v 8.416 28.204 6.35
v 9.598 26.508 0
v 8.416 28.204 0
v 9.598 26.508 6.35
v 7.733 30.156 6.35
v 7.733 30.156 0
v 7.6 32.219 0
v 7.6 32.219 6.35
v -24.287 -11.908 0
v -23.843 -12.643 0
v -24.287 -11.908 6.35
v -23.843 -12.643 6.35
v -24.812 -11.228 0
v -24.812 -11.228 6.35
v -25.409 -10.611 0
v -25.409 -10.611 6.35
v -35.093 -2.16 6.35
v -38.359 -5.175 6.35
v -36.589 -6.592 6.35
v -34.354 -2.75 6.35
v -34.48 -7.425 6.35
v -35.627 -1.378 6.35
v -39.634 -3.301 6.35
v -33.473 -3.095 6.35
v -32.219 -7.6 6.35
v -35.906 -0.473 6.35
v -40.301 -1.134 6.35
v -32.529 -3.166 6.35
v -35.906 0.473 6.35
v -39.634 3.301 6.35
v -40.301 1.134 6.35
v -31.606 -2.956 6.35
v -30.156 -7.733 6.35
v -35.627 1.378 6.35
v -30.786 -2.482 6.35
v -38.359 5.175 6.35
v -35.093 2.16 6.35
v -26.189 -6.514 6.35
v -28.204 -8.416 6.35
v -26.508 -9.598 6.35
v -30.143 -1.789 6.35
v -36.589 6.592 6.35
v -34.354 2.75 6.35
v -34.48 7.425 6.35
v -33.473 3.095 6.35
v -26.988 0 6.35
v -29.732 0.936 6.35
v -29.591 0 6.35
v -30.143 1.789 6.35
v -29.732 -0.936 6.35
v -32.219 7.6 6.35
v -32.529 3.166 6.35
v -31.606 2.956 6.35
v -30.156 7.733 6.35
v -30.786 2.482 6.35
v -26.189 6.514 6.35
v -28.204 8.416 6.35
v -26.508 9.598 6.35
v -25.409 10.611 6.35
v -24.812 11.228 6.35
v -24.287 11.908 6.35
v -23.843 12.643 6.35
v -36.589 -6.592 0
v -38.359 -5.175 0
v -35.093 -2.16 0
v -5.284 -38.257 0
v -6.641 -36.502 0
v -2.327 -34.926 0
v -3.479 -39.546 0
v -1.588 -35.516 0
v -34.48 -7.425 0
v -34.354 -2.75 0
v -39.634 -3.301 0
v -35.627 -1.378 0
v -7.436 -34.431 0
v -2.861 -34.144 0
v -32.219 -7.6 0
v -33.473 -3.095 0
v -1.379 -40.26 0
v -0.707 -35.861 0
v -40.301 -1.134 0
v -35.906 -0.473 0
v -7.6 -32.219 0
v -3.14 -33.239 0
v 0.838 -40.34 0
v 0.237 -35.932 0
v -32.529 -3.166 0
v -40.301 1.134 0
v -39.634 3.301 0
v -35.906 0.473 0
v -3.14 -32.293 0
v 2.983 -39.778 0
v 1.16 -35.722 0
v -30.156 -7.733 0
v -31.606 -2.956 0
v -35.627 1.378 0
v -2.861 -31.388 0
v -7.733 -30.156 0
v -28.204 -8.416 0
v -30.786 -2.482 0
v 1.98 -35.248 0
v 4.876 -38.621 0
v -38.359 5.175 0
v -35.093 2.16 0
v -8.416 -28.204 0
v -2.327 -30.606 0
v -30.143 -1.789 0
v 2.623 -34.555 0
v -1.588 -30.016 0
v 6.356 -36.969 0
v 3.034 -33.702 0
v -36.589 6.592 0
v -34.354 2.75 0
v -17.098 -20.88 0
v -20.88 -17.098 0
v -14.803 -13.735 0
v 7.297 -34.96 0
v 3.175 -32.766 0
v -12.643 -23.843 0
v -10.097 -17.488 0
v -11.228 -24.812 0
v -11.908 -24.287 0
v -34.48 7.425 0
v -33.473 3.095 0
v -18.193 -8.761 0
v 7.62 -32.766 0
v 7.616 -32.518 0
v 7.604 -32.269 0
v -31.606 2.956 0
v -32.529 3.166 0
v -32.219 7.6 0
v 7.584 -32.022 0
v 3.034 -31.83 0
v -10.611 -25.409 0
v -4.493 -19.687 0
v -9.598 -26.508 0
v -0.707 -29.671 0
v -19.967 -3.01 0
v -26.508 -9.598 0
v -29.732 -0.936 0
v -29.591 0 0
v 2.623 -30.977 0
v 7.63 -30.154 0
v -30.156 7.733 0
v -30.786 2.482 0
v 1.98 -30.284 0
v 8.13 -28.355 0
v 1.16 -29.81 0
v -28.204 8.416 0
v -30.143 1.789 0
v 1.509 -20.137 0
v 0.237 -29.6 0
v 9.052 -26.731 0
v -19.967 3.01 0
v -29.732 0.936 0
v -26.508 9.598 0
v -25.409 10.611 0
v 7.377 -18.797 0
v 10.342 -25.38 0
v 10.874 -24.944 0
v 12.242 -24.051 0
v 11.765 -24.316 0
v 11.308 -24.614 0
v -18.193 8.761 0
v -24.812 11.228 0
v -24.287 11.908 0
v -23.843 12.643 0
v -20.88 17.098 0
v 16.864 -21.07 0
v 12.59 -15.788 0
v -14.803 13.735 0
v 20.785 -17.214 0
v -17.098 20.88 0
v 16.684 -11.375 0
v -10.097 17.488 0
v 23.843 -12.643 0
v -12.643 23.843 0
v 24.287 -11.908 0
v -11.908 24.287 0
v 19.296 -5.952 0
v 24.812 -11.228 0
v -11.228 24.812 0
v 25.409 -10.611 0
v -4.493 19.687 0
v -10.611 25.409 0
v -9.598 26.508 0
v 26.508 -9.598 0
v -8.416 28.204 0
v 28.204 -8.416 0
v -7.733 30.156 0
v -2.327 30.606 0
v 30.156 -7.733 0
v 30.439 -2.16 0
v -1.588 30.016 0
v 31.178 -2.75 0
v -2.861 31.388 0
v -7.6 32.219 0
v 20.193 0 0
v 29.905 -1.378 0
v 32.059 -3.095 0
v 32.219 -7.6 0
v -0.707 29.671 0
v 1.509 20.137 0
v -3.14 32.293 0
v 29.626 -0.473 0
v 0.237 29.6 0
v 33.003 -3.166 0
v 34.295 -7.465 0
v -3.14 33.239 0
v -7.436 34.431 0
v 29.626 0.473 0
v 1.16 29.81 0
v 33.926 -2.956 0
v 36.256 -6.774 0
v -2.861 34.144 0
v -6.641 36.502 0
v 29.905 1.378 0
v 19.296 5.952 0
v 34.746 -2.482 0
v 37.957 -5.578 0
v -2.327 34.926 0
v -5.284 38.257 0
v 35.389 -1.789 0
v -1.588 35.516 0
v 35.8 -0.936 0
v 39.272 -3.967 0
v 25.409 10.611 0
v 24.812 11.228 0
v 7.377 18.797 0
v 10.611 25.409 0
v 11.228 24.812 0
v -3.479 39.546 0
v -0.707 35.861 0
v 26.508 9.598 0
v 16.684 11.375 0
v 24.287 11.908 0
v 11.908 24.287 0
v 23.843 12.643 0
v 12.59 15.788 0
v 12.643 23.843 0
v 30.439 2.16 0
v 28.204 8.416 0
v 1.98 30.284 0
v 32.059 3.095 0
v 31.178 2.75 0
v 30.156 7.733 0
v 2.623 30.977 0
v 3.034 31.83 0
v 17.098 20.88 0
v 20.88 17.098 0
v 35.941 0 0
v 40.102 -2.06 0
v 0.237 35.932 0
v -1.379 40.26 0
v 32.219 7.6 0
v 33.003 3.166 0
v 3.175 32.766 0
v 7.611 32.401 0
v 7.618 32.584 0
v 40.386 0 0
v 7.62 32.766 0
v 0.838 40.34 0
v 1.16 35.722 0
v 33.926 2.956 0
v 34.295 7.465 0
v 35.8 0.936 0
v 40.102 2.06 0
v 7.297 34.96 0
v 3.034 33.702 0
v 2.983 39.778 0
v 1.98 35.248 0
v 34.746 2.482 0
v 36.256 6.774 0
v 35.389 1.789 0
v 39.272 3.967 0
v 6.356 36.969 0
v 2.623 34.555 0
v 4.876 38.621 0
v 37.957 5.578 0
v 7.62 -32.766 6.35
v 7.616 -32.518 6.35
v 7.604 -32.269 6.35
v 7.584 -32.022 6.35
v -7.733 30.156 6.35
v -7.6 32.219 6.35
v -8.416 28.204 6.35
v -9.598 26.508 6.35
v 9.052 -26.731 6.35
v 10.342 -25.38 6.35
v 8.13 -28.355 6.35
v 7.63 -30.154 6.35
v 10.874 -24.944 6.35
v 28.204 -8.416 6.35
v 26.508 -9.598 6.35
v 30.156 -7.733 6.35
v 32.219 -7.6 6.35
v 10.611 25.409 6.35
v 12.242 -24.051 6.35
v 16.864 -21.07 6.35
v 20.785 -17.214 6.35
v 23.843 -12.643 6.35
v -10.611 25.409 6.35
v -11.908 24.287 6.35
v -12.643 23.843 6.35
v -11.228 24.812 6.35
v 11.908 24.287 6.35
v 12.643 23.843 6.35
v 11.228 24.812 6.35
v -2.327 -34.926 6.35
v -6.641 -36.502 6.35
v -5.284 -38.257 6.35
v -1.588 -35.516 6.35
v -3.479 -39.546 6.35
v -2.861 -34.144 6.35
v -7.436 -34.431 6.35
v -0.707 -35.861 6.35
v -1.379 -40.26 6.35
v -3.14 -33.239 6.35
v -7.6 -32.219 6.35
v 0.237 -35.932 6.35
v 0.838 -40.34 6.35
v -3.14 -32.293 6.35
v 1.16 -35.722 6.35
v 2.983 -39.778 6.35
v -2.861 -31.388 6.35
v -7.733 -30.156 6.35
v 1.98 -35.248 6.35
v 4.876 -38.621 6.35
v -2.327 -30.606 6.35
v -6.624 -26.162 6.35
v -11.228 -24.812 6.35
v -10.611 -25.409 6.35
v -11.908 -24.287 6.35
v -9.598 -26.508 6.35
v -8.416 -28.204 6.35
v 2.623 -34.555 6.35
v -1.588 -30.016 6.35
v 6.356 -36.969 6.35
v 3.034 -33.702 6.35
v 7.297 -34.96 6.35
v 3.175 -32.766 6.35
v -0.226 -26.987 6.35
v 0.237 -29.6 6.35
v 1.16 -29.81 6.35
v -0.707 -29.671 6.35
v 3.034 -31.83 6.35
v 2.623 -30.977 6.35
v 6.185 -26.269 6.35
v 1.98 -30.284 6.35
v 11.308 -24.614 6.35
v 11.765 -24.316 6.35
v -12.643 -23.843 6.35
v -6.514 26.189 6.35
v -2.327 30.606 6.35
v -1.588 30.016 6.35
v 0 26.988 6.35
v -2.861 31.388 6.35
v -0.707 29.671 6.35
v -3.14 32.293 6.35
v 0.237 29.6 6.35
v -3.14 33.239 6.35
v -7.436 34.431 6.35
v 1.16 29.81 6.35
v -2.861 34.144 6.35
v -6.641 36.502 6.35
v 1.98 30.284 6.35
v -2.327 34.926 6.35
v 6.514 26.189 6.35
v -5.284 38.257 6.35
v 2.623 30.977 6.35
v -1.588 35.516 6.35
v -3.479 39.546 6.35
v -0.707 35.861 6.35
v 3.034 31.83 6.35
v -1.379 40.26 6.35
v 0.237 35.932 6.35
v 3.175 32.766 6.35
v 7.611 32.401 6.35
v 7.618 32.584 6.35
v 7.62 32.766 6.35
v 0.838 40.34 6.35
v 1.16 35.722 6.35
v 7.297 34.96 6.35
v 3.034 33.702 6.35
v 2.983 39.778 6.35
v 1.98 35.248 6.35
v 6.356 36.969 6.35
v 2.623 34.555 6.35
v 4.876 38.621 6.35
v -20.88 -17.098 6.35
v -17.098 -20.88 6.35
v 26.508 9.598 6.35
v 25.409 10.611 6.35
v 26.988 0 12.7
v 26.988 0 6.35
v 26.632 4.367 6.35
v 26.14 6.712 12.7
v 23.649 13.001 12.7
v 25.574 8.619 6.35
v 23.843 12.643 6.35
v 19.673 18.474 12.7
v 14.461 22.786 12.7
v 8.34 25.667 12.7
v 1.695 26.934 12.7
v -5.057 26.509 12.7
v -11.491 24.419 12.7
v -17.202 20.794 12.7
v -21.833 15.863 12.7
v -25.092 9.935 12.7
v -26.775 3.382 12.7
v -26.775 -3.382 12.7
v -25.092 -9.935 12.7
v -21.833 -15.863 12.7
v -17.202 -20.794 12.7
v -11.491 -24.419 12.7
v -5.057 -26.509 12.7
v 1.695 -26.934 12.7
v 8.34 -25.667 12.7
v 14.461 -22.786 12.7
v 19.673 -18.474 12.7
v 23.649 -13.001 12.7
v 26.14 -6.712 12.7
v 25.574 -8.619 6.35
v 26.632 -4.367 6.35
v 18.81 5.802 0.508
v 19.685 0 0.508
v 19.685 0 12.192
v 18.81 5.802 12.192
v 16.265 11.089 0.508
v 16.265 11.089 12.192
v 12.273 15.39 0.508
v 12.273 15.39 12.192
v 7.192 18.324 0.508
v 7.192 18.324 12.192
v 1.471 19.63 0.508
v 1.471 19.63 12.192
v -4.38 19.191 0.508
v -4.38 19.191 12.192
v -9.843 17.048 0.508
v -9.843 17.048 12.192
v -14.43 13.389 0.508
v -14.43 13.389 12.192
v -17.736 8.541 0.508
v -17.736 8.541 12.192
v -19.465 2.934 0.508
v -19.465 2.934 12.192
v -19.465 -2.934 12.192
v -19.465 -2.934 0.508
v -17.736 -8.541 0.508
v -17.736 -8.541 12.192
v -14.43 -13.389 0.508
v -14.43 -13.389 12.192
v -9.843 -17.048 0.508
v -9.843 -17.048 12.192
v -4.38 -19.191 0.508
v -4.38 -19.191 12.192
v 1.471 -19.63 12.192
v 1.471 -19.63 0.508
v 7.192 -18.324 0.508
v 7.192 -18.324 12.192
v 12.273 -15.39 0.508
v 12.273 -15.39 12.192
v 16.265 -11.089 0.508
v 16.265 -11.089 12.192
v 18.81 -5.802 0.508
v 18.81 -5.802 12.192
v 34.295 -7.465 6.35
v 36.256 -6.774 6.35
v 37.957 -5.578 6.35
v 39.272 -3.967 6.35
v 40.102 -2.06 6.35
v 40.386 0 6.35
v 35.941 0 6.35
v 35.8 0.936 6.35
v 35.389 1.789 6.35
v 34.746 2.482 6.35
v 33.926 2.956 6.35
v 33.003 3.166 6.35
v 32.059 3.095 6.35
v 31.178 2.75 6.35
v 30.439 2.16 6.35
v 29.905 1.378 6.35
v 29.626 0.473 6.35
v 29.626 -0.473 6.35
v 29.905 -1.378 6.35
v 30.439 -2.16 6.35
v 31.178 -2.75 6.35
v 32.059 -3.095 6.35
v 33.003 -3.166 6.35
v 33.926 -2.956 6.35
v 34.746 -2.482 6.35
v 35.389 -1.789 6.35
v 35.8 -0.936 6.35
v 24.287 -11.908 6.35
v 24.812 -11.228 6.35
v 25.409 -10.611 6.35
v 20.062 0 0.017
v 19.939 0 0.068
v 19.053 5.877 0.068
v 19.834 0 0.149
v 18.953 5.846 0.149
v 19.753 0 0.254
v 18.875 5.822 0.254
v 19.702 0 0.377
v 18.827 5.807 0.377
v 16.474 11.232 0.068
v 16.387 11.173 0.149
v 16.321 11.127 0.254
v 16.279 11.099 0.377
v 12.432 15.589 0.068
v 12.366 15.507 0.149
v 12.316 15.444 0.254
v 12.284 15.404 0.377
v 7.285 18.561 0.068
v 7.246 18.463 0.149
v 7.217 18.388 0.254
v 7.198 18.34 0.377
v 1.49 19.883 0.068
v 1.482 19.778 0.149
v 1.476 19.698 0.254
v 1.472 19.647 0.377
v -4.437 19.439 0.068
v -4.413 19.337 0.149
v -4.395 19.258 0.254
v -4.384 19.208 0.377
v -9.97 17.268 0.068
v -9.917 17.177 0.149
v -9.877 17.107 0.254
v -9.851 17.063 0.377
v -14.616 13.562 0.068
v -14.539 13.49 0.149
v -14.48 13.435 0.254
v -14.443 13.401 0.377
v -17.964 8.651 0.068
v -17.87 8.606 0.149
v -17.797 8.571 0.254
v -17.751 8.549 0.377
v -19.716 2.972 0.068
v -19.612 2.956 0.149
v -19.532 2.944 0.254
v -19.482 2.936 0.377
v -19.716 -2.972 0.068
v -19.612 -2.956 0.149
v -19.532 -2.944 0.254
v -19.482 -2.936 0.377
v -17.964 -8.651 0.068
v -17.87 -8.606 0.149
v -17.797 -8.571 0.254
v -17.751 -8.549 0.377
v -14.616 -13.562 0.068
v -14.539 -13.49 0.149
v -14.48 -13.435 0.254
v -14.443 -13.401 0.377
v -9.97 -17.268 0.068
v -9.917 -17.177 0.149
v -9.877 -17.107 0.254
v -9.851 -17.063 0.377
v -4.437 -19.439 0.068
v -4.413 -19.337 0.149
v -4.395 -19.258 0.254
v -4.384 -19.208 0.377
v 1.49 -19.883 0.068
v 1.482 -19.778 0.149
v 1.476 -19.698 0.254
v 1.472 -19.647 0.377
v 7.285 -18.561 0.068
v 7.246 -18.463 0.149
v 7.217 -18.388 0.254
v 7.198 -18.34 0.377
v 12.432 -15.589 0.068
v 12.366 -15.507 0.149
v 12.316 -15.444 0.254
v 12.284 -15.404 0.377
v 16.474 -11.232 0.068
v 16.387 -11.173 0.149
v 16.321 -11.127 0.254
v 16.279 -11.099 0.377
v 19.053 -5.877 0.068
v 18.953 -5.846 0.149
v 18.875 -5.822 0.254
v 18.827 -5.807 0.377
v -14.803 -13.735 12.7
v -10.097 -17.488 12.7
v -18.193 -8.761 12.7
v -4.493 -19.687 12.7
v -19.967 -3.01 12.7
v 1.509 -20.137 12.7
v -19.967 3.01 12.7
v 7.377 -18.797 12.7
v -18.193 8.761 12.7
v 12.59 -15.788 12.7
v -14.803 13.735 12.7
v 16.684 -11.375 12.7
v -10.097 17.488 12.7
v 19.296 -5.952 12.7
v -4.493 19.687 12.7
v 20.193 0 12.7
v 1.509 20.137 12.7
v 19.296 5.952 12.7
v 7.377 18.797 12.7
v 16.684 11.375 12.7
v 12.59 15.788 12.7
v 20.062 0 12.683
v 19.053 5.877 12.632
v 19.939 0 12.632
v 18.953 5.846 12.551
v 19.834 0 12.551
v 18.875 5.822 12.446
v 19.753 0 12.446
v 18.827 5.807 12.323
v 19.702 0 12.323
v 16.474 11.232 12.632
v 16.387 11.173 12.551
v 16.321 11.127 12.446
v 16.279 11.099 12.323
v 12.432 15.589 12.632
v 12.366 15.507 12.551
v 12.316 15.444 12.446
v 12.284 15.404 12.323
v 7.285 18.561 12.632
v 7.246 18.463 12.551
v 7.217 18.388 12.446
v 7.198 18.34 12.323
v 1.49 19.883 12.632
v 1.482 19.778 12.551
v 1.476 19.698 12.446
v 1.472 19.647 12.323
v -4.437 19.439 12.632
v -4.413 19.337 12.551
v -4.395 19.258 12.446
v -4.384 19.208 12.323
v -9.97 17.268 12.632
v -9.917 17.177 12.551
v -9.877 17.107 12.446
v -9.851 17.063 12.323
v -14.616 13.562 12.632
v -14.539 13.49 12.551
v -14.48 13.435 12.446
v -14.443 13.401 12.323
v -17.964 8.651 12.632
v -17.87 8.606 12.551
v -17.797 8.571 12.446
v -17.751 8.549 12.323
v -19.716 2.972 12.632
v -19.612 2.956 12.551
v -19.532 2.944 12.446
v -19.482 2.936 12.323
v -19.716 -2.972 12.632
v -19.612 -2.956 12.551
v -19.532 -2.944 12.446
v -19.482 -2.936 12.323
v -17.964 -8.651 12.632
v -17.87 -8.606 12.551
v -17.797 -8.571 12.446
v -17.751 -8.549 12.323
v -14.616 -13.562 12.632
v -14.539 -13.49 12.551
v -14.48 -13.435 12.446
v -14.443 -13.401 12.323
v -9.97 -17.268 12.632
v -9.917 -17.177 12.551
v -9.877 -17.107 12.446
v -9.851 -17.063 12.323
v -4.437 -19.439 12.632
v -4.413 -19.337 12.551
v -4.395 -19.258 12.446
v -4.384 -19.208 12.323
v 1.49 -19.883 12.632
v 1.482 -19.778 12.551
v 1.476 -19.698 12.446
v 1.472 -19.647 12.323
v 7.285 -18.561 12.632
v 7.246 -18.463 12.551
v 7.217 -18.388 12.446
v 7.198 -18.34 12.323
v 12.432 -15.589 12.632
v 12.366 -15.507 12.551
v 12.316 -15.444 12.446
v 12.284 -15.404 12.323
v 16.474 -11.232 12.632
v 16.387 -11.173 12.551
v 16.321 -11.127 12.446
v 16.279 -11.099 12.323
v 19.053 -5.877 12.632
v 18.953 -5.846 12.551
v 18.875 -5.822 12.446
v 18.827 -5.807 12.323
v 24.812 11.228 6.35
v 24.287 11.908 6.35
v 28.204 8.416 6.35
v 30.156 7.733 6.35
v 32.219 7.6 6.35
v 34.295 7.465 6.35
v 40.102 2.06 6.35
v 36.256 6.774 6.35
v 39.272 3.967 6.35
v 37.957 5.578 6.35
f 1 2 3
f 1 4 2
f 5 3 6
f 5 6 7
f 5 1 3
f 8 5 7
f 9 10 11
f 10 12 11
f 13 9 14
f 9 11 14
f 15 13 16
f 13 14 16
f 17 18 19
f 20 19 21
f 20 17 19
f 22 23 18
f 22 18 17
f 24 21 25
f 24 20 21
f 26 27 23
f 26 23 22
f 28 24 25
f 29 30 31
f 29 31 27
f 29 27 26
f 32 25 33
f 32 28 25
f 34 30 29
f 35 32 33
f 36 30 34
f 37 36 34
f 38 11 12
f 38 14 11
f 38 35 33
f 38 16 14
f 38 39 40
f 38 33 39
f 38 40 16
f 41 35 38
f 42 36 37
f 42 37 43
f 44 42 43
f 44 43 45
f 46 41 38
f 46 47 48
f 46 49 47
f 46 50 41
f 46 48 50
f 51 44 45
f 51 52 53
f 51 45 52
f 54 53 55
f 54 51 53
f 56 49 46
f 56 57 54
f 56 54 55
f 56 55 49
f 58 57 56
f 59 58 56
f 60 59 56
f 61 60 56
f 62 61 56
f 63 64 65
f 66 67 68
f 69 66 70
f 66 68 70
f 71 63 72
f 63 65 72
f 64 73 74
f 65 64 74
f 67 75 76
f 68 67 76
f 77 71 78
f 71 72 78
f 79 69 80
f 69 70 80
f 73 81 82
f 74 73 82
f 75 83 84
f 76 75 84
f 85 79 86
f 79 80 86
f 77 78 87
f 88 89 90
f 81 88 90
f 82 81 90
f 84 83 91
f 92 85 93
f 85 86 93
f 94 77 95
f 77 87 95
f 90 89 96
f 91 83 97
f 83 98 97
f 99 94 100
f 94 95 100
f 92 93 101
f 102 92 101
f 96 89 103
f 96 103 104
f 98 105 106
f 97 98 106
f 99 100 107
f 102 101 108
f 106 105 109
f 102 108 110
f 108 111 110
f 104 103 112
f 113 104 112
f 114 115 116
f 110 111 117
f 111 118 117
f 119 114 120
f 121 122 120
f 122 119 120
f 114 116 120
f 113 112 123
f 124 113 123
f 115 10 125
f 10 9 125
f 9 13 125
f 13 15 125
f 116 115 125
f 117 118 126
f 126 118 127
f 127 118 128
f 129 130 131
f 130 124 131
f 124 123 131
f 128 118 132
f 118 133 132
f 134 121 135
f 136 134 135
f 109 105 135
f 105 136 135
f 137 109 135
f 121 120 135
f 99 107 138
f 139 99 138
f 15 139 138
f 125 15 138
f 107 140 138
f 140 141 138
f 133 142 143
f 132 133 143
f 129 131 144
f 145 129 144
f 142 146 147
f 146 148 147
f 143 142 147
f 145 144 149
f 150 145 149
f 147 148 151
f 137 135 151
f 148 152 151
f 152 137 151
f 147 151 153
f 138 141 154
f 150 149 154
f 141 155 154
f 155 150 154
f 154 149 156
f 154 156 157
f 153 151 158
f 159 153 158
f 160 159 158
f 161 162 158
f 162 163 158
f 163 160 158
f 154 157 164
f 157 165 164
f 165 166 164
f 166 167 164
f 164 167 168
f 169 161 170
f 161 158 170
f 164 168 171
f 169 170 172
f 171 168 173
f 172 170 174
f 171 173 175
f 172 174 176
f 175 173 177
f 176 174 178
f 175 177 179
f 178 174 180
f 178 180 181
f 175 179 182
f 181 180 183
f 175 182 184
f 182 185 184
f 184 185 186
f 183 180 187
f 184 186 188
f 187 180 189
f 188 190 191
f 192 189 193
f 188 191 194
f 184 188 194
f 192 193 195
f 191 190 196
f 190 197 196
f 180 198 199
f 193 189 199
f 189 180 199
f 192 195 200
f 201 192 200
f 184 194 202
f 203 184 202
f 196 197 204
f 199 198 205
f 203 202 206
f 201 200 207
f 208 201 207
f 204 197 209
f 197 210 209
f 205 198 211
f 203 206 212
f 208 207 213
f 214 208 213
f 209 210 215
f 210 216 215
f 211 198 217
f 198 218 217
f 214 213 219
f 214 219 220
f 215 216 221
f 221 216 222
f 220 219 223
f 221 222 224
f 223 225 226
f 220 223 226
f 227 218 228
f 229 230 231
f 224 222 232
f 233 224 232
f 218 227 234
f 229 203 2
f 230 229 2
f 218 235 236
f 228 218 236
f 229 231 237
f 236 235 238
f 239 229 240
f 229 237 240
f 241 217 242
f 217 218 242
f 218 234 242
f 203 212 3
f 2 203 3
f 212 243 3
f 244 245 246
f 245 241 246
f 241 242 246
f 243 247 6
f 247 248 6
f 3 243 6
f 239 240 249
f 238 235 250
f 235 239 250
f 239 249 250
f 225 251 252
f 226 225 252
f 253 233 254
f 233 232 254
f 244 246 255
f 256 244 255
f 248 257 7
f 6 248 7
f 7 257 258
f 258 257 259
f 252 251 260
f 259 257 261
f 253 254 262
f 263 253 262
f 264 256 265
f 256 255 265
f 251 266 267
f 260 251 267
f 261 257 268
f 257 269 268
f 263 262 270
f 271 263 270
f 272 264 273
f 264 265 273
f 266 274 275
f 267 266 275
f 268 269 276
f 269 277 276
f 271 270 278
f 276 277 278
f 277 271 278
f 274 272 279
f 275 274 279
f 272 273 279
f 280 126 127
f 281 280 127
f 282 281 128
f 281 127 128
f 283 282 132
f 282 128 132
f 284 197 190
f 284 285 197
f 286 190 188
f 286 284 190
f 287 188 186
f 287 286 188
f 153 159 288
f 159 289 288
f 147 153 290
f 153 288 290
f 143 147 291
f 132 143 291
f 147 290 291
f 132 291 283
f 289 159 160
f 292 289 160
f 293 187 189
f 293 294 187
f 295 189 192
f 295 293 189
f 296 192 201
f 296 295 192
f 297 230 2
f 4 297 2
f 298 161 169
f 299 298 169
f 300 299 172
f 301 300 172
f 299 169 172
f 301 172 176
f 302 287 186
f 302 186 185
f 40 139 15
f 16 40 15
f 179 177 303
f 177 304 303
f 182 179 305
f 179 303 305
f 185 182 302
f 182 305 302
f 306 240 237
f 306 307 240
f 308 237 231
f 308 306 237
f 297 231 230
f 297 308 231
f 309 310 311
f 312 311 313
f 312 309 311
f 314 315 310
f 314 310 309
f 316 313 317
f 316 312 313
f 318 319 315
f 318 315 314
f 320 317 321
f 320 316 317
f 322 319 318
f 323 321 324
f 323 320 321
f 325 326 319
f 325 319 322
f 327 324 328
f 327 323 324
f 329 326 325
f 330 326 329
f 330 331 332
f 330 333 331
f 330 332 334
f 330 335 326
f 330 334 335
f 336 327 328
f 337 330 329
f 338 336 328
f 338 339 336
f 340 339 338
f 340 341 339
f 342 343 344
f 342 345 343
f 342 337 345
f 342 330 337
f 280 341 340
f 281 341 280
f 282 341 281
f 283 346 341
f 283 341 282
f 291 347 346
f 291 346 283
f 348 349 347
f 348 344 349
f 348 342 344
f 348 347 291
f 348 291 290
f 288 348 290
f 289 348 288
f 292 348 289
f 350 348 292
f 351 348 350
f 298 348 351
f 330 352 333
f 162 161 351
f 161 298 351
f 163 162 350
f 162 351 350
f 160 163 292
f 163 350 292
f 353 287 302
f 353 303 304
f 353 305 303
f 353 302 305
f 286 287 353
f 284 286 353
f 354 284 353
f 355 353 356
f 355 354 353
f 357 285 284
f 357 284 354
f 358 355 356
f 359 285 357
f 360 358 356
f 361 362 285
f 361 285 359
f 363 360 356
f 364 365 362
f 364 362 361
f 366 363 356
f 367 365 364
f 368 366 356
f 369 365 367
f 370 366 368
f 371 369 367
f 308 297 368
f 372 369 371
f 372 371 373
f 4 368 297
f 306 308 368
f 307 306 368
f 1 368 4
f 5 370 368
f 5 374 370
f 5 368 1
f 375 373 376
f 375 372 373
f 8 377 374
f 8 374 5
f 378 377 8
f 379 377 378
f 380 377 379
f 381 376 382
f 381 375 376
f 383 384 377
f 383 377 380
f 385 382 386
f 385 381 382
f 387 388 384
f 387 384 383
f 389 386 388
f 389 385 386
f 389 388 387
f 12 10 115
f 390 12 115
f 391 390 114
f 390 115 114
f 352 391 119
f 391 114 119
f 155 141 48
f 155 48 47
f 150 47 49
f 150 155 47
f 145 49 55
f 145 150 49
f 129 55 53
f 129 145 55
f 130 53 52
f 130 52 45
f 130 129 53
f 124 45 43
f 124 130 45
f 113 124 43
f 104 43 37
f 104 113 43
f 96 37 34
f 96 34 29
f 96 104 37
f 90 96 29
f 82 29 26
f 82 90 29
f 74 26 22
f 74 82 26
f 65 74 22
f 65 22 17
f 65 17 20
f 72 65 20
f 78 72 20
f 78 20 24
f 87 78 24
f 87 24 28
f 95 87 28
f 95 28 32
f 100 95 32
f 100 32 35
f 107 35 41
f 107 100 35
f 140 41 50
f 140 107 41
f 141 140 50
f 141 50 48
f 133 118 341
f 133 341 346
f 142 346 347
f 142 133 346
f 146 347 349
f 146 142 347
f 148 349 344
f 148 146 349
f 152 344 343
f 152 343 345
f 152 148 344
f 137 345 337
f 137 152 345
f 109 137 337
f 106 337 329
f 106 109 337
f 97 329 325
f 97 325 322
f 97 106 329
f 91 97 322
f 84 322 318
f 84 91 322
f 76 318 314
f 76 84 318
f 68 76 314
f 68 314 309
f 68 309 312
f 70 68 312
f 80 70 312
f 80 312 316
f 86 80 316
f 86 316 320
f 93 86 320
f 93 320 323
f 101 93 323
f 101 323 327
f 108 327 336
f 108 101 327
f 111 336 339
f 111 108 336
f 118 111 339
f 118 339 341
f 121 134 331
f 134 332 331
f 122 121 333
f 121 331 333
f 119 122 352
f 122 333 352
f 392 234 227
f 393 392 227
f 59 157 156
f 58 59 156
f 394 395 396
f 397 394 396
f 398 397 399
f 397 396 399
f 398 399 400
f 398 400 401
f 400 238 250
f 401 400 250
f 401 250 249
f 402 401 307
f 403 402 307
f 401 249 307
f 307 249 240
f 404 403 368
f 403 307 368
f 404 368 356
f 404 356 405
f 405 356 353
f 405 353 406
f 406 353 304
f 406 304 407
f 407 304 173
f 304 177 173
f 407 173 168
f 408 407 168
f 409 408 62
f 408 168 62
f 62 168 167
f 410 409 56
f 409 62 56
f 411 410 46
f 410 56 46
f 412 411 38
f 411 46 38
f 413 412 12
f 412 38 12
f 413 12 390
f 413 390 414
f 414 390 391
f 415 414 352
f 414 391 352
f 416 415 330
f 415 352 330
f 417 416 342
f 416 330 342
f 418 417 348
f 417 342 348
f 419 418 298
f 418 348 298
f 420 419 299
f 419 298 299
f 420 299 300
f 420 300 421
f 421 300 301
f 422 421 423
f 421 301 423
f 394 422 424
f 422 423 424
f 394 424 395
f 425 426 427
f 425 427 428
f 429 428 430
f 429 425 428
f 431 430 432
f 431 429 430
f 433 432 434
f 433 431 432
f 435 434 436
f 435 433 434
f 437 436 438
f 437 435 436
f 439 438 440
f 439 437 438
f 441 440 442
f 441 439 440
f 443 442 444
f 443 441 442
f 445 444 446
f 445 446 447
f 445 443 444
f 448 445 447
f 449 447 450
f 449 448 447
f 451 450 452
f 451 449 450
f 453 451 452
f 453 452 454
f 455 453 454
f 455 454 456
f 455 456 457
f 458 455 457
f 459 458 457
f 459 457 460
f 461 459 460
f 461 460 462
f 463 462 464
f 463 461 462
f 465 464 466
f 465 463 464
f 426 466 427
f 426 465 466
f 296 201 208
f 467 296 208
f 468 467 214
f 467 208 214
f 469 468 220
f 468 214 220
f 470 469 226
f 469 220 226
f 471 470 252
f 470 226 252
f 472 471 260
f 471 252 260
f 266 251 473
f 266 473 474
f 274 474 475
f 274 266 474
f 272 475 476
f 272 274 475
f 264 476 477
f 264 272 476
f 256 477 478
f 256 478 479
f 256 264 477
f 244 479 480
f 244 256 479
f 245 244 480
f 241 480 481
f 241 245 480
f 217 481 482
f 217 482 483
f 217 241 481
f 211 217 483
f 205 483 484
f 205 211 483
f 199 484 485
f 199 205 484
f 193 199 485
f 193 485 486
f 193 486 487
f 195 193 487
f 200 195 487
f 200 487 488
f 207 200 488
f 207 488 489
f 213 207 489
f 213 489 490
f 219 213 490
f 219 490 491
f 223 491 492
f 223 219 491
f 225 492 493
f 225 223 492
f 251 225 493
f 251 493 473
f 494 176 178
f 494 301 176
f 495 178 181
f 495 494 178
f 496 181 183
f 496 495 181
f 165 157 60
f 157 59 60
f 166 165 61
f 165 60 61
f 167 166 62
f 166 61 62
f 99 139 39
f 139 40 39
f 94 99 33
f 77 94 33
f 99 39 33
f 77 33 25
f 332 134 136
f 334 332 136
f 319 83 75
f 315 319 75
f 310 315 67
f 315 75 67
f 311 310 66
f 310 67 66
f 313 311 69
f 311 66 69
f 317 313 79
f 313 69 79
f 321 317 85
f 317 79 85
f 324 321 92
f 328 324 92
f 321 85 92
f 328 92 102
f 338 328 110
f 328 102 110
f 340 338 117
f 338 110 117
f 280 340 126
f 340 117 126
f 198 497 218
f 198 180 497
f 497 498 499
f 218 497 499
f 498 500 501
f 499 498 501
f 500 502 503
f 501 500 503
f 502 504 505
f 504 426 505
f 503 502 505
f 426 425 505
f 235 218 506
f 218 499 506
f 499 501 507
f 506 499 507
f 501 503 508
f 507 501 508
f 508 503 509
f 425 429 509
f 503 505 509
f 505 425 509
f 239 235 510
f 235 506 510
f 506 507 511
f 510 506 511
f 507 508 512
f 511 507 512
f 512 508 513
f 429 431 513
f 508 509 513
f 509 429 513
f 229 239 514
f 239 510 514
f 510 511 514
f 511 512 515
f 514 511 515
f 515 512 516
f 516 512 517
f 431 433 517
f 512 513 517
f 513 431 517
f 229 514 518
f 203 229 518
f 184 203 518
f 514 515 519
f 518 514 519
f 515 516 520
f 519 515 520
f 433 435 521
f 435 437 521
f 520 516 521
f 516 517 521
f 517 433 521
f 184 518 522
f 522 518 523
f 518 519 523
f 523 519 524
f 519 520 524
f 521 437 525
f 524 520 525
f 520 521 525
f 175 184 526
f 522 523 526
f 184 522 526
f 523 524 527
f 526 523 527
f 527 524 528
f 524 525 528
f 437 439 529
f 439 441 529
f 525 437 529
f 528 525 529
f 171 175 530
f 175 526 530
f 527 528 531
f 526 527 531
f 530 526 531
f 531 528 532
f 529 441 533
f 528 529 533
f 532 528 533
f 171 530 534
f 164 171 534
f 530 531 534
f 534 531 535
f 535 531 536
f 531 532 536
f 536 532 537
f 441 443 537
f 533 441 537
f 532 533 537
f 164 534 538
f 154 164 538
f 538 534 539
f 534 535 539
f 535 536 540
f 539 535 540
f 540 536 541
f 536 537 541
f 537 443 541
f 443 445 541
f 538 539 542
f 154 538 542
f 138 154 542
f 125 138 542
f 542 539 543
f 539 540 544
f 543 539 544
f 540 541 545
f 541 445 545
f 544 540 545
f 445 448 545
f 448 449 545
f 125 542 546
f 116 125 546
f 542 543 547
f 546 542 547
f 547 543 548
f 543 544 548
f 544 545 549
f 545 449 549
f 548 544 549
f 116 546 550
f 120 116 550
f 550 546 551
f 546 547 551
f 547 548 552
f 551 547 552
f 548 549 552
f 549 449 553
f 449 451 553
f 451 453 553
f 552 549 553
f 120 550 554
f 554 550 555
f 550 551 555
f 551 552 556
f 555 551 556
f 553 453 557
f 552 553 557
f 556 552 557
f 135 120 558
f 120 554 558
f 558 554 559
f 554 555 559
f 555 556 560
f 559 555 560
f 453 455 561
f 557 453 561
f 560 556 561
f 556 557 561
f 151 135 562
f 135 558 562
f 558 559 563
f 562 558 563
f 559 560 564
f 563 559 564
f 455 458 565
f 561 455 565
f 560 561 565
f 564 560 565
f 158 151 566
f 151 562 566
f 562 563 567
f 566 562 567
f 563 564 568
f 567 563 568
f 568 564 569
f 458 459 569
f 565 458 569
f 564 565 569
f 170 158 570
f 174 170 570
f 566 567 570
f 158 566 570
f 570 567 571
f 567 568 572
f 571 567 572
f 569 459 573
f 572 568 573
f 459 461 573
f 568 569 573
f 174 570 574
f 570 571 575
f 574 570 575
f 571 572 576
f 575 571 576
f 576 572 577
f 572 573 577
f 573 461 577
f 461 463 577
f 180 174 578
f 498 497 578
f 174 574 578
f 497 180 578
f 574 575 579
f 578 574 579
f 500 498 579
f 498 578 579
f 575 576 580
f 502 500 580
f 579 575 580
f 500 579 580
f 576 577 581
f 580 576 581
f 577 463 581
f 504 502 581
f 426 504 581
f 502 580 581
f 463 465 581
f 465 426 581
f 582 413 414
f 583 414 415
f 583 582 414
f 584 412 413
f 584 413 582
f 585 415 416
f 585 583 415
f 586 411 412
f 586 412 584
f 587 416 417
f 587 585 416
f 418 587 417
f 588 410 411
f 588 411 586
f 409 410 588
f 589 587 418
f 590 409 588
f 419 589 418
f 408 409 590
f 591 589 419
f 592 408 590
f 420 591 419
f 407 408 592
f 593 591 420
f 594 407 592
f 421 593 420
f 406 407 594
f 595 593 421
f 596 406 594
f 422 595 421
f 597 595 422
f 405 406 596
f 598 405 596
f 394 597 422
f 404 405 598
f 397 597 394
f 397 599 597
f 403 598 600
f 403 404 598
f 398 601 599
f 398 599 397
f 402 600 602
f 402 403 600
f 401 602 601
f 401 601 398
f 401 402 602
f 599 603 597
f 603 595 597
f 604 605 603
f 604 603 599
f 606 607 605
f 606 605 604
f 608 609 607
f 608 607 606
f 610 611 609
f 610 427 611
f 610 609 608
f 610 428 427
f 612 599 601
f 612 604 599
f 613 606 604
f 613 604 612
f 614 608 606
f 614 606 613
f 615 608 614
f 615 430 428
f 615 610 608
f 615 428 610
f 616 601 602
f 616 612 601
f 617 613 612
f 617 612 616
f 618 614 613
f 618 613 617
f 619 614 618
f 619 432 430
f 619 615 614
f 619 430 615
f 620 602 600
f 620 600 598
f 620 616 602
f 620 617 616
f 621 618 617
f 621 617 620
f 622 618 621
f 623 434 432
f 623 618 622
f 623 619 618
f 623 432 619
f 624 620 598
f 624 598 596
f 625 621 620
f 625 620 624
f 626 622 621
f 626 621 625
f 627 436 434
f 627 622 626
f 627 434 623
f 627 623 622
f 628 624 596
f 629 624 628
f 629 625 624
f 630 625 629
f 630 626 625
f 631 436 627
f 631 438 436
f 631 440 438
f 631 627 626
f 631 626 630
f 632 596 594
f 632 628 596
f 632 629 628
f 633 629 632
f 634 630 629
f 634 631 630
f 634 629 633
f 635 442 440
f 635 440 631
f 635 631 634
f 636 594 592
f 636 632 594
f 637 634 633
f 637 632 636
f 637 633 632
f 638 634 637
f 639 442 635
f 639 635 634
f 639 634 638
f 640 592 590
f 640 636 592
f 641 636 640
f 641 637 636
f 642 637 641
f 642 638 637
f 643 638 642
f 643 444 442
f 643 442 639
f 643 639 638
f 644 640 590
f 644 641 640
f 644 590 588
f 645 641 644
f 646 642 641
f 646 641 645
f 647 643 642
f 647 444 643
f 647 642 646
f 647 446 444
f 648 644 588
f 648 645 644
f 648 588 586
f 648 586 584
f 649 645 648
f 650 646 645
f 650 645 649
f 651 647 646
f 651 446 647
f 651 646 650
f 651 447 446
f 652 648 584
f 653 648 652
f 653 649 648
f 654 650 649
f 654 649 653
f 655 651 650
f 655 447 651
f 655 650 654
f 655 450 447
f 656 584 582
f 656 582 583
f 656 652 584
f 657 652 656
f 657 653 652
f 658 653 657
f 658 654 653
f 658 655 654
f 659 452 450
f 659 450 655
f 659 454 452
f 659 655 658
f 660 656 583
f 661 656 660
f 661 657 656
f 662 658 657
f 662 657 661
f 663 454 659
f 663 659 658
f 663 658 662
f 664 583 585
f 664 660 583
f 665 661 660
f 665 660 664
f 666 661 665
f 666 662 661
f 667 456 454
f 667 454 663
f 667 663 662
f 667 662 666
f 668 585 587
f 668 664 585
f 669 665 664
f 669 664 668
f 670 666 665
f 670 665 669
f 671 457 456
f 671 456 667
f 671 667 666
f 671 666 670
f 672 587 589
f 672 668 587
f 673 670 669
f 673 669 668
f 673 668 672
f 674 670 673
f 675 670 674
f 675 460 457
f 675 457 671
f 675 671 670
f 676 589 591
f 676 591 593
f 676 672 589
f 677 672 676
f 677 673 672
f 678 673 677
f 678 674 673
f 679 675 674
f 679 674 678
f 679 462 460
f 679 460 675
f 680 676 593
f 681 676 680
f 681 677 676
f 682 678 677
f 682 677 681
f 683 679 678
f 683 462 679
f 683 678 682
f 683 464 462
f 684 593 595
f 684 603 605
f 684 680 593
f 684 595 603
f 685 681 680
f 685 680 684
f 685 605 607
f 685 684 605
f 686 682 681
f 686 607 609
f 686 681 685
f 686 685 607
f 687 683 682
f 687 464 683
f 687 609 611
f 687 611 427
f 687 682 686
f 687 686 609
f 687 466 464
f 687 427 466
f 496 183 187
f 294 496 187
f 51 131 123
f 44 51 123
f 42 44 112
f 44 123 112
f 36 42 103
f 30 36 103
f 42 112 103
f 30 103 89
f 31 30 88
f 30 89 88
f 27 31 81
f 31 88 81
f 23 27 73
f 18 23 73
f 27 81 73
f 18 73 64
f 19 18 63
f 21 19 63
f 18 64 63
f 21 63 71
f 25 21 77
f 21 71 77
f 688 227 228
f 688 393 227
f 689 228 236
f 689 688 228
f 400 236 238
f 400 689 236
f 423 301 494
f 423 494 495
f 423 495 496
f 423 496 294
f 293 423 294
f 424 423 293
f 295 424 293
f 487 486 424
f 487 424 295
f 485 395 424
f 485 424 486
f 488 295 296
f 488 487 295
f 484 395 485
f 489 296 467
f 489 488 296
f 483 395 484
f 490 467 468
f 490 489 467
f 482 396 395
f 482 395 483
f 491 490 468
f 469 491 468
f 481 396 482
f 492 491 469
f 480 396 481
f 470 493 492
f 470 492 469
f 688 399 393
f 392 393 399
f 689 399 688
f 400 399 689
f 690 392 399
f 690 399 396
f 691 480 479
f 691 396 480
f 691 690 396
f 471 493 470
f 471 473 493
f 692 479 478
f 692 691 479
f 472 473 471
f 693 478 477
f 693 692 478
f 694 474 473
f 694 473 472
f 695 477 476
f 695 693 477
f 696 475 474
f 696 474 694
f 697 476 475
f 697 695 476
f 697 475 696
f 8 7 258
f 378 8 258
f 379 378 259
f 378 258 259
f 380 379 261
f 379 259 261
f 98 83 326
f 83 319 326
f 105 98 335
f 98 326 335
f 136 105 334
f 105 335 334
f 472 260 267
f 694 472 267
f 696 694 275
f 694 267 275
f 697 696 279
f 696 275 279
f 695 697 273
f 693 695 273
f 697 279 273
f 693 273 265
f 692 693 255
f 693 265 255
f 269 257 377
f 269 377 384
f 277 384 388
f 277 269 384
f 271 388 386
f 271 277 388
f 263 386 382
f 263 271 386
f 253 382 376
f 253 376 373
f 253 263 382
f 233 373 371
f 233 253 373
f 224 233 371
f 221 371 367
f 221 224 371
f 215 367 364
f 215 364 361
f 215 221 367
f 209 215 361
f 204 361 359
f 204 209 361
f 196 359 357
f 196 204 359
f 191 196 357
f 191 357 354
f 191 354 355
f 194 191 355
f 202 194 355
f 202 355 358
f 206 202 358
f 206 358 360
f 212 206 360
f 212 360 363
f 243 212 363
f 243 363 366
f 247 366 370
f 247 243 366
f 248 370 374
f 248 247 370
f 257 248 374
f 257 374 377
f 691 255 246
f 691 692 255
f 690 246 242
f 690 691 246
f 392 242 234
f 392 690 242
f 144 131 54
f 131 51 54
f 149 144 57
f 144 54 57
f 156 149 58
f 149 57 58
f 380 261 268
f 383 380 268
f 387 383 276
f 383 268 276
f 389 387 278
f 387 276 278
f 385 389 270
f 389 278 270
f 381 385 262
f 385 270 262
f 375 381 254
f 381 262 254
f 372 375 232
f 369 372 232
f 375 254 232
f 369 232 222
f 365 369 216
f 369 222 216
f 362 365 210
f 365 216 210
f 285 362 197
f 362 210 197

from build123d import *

# Parameters (mm, degrees)
F0_R     = 3.175
F0_R_2   = 20.32
F1_DEPTH = 6.35
F2_R     = 7.62
F3_R     = 26.9875
F3_R_2   = 19.685
F4_DEPTH = 12.7
F5_R     = 0.508


with BuildPart() as f1:
    # F0 (on Top) → F1 (new body)
    with BuildSketch(Plane.XY):
        with BuildLine():
            ThreePointArc((-11.5499308761, 24.3910691239), (-8.0975226707, 25.7440339273), (-4.4922459427, 26.6109917636))
            ThreePointArc((-4.4922459427, 26.6109917636), (-5.8575862517, 27.8922864976), (-6.8692513658, 29.4678511747))
            Line((-6.8692513658, 29.4678511747), (-11.5499308761, 24.3910691239))
        make_face()
        with BuildLine():
            ThreePointArc((4.4922459427, 26.6109917636), (8.0975226707, 25.7440339273), (11.5499308761, 24.3910691239))
            Line((11.5499308761, 24.3910691239), (6.8692513658, 29.4678511747))
            ThreePointArc((6.8692513658, 29.4678511747), (5.8575862517, 27.8922864976), (4.4922459427, 26.6109917636))
        make_face()
        with BuildLine():
            ThreePointArc((-4.4922459427, 26.6109917636), (0, 26.9875), (4.4922459427, 26.6109917636))
            ThreePointArc((4.4922459427, 26.6109917636), (5.8575862517, 27.8922864976), (6.8692513658, 29.4678511747))
            ThreePointArc((6.8692513658, 29.4678511747), (7.4299426447, 31.0747423921), (7.62, 32.766))
            ThreePointArc((7.62, 32.766), (-1.6912576079, 40.1959426447), (-6.8692513658, 29.4678511747))
            ThreePointArc((-6.8692513658, 29.4678511747), (-5.8575862517, 27.8922864976), (-4.4922459427, 26.6109917636))
        make_face()
        with Locations((0, 32.766)):
            Circle(F0_R, mode=Mode.SUBTRACT)
        with BuildLine():
            ThreePointArc((-4.4922459427, 26.6109917636), (0, 25.146), (4.4922459427, 26.6109917636))
            ThreePointArc((4.4922459427, 26.6109917636), (0, 26.9875), (-4.4922459427, 26.6109917636))
        make_face()
        with BuildLine():
            ThreePointArc((-26.6109917636, 4.4922459427), (-25.7440339273, 8.0975226707), (-24.3910691239, 11.5499308761))
            Line((-24.3910691239, 11.5499308761), (-29.4678511747, 6.8692513658))
            ThreePointArc((-29.4678511747, 6.8692513658), (-27.8922864976, 5.8575862517), (-26.6109917636, 4.4922459427))
        make_face()
        with BuildLine():
            ThreePointArc((-26.6109917636, -4.4922459427), (-26.9875, 0), (-26.6109917636, 4.4922459427))
            ThreePointArc((-26.6109917636, 4.4922459427), (-27.8922864976, 5.8575862517), (-29.4678511747, 6.8692513658))
            ThreePointArc((-29.4678511747, 6.8692513658), (-40.386, 0), (-29.4678511747, -6.8692513658))
            ThreePointArc((-29.4678511747, -6.8692513658), (-27.8922864976, -5.8575862517), (-26.6109917636, -4.4922459427))
        make_face()
        with Locations((-32.766, 0)):
            Circle(F0_R, mode=Mode.SUBTRACT)
        with BuildLine():
            ThreePointArc((-25.146, 0), (-25.521499922, 2.3625449454), (-26.6109917636, 4.4922459427))
            ThreePointArc((-26.6109917636, 4.4922459427), (-26.9875, 0), (-26.6109917636, -4.4922459427))
            ThreePointArc((-26.6109917636, -4.4922459427), (-25.521499922, -2.3625449454), (-25.146, 0))
        make_face()
        with BuildLine():
            ThreePointArc((-24.3910691239, -11.5499308761), (-25.7440339273, -8.0975226707), (-26.6109917636, -4.4922459427))
            ThreePointArc((-26.6109917636, -4.4922459427), (-27.8922864976, -5.8575862517), (-29.4678511747, -6.8692513658))
            Line((-29.4678511747, -6.8692513658), (-24.3910691239, -11.5499308761))
        make_face()
        with BuildLine():
            ThreePointArc((-6.8692513658, -29.4678511747), (-5.8575862517, -27.8922864976), (-4.4922459427, -26.6109917636))
            ThreePointArc((-4.4922459427, -26.6109917636), (-8.0975226707, -25.7440339273), (-11.5499308761, -24.3910691239))
            Line((-11.5499308761, -24.3910691239), (-6.8692513658, -29.4678511747))
        make_face()
        with BuildLine():
            ThreePointArc((-4.4922459427, -26.6109917636), (0, -26.9875), (4.4922459427, -26.6109917636))
            ThreePointArc((4.4922459427, -26.6109917636), (0, -25.146), (-4.4922459427, -26.6109917636))
        make_face()
        with BuildLine():
            ThreePointArc((6.3892768918, -28.6137065614), (5.5321425722, -27.5257902179), (4.4922459427, -26.6109917636))
            ThreePointArc((4.4922459427, -26.6109917636), (0, -26.9875), (-4.4922459427, -26.6109917636))
            ThreePointArc((-4.4922459427, -26.6109917636), (-5.8575862517, -27.8922864976), (-6.8692513658, -29.4678511747))
            ThreePointArc((-6.8692513658, -29.4678511747), (-1.6912576079, -40.1959426447), (7.62, -32.766))
            ThreePointArc((7.62, -32.766), (7.3058432065, -30.6005773987), (6.3892768918, -28.6137065614))
        make_face()
        with Locations((0, -32.766)):
            Circle(F0_R, mode=Mode.SUBTRACT)
        with BuildLine():
            ThreePointArc((6.3892768918, -28.6137065614), (5.5321425722, -27.5257902179), (4.4922459427, -26.6109917636))
            ThreePointArc((4.4922459427, -26.6109917636), (0, -26.9875), (-4.4922459427, -26.6109917636))
            ThreePointArc((-4.4922459427, -26.6109917636), (-5.8575862517, -27.8922864976), (-6.8692513658, -29.4678511747))
            ThreePointArc((-6.8692513658, -29.4678511747), (-1.6912576079, -40.1959426447), (7.62, -32.766))
            ThreePointArc((7.62, -32.766), (7.3058432065, -30.6005773987), (6.3892768918, -28.6137065614))
        make_face()
        with Locations((0, -32.766)):
            Circle(F0_R, mode=Mode.SUBTRACT)
        with BuildLine():
            Line((6.3892768918, -28.6137065614), (11.5499308761, -24.3910691239))
            ThreePointArc((11.5499308761, -24.3910691239), (8.0975226707, -25.7440339273), (4.4922459427, -26.6109917636))
            ThreePointArc((4.4922459427, -26.6109917636), (5.5321425722, -27.5257902179), (6.3892768918, -28.6137065614))
        make_face()
        with BuildLine():
            ThreePointArc((29.4678511747, -6.8692513658), (27.8922864976, -5.8575862517), (26.6109917636, -4.4922459427))
            ThreePointArc((26.6109917636, -4.4922459427), (25.7440339273, -8.0975226707), (24.3910691239, -11.5499308761))
            Line((24.3910691239, -11.5499308761), (29.4678511747, -6.8692513658))
        make_face()
        with BuildLine():
            ThreePointArc((29.4678511747, 6.8692513658), (27.8922864976, 5.8575862517), (26.6109917636, 4.4922459427))
            ThreePointArc((26.6109917636, 4.4922459427), (26.8932082176, 2.2539982288), (26.9875, 0))
            ThreePointArc((26.9875, 0), (26.8932082176, -2.2539982288), (26.6109917636, -4.4922459427))
            ThreePointArc((26.6109917636, -4.4922459427), (27.8922864976, -5.8575862517), (29.4678511747, -6.8692513658))
            ThreePointArc((29.4678511747, -6.8692513658), (36.8238631046, -6.4496625512), (40.386, 0))
            ThreePointArc((40.386, 0), (36.8238631046, 6.4496625512), (29.4678511747, 6.8692513658))
        make_face()
        with Locations((32.766, 0)):
            Circle(F0_R, mode=Mode.SUBTRACT)
        with BuildLine():
            ThreePointArc((26.9875, 0), (26.8932082176, 2.2539982288), (26.6109917636, 4.4922459427))
            ThreePointArc((26.6109917636, 4.4922459427), (25.146, 0), (26.6109917636, -4.4922459427))
            ThreePointArc((26.6109917636, -4.4922459427), (26.8932082176, -2.2539982288), (26.9875, 0))
        make_face()
        with BuildLine():
            Line((29.4678511747, 6.8692513658), (24.3910691239, 11.5499308761))
            ThreePointArc((24.3910691239, 11.5499308761), (25.7440339273, 8.0975226707), (26.6109917636, 4.4922459427))
            ThreePointArc((26.6109917636, 4.4922459427), (27.8922864976, 5.8575862517), (29.4678511747, 6.8692513658))
        make_face()
        with BuildLine():
            ThreePointArc((26.6109917636, 4.4922459427), (25.7440339273, 8.0975226707), (24.3910691239, 11.5499308761))
            ThreePointArc((24.3910691239, 11.5499308761), (19.0830442573, 19.0830442573), (11.5499308761, 24.3910691239))
            ThreePointArc((11.5499308761, 24.3910691239), (8.0975226707, 25.7440339273), (4.4922459427, 26.6109917636))
            ThreePointArc((4.4922459427, 26.6109917636), (0, 25.146), (-4.4922459427, 26.6109917636))
            ThreePointArc((-4.4922459427, 26.6109917636), (-8.0975226707, 25.7440339273), (-11.5499308761, 24.3910691239))
            ThreePointArc((-11.5499308761, 24.3910691239), (-19.0830442573, 19.0830442573), (-24.3910691239, 11.5499308761))
            ThreePointArc((-24.3910691239, 11.5499308761), (-25.7440339273, 8.0975226707), (-26.6109917636, 4.4922459427))
            ThreePointArc((-26.6109917636, 4.4922459427), (-25.521499922, 2.3625449454), (-25.146, 0))
            ThreePointArc((-25.146, 0), (-25.521499922, -2.3625449454), (-26.6109917636, -4.4922459427))
            ThreePointArc((-26.6109917636, -4.4922459427), (-25.7440339273, -8.0975226707), (-24.3910691239, -11.5499308761))
            ThreePointArc((-24.3910691239, -11.5499308761), (-19.0830442573, -19.0830442573), (-11.5499308761, -24.3910691239))
            ThreePointArc((-11.5499308761, -24.3910691239), (-8.0975226707, -25.7440339273), (-4.4922459427, -26.6109917636))
            ThreePointArc((-4.4922459427, -26.6109917636), (0, -25.146), (4.4922459427, -26.6109917636))
            ThreePointArc((4.4922459427, -26.6109917636), (8.0975226707, -25.7440339273), (11.5499308761, -24.3910691239))
            ThreePointArc((11.5499308761, -24.3910691239), (19.0830442573, -19.0830442573), (24.3910691239, -11.5499308761))
            ThreePointArc((24.3910691239, -11.5499308761), (25.7440339273, -8.0975226707), (26.6109917636, -4.4922459427))
            ThreePointArc((26.6109917636, -4.4922459427), (25.146, 0), (26.6109917636, 4.4922459427))
        make_face()
        Circle(F0_R_2, mode=Mode.SUBTRACT)
        with BuildLine():
            ThreePointArc((-4.4922459427, 26.6109917636), (0, 26.9875), (4.4922459427, 26.6109917636))
            ThreePointArc((4.4922459427, 26.6109917636), (5.8575862517, 27.8922864976), (6.8692513658, 29.4678511747))
            ThreePointArc((6.8692513658, 29.4678511747), (7.4299426447, 31.0747423921), (7.62, 32.766))
            ThreePointArc((7.62, 32.766), (-1.6912576079, 40.1959426447), (-6.8692513658, 29.4678511747))
            ThreePointArc((-6.8692513658, 29.4678511747), (-5.8575862517, 27.8922864976), (-4.4922459427, 26.6109917636))
        make_face()
        with Locations((0, 32.766)):
            Circle(F0_R, mode=Mode.SUBTRACT)
        with BuildLine():
            ThreePointArc((-26.6109917636, -4.4922459427), (-26.9875, 0), (-26.6109917636, 4.4922459427))
            ThreePointArc((-26.6109917636, 4.4922459427), (-27.8922864976, 5.8575862517), (-29.4678511747, 6.8692513658))
            ThreePointArc((-29.4678511747, 6.8692513658), (-40.386, 0), (-29.4678511747, -6.8692513658))
            ThreePointArc((-29.4678511747, -6.8692513658), (-27.8922864976, -5.8575862517), (-26.6109917636, -4.4922459427))
        make_face()
        with Locations((-32.766, 0)):
            Circle(F0_R, mode=Mode.SUBTRACT)
        with BuildLine():
            ThreePointArc((29.4678511747, 6.8692513658), (27.8922864976, 5.8575862517), (26.6109917636, 4.4922459427))
            ThreePointArc((26.6109917636, 4.4922459427), (26.8932082176, 2.2539982288), (26.9875, 0))
            ThreePointArc((26.9875, 0), (26.8932082176, -2.2539982288), (26.6109917636, -4.4922459427))
            ThreePointArc((26.6109917636, -4.4922459427), (27.8922864976, -5.8575862517), (29.4678511747, -6.8692513658))
            ThreePointArc((29.4678511747, -6.8692513658), (36.8238631046, -6.4496625512), (40.386, 0))
            ThreePointArc((40.386, 0), (36.8238631046, 6.4496625512), (29.4678511747, 6.8692513658))
        make_face()
        with Locations((32.766, 0)):
            Circle(F0_R, mode=Mode.SUBTRACT)
        with BuildLine():
            ThreePointArc((6.3892768918, -28.6137065614), (5.5321425722, -27.5257902179), (4.4922459427, -26.6109917636))
            ThreePointArc((4.4922459427, -26.6109917636), (0, -26.9875), (-4.4922459427, -26.6109917636))
            ThreePointArc((-4.4922459427, -26.6109917636), (-5.8575862517, -27.8922864976), (-6.8692513658, -29.4678511747))
            ThreePointArc((-6.8692513658, -29.4678511747), (-1.6912576079, -40.1959426447), (7.62, -32.766))
            ThreePointArc((7.62, -32.766), (7.3058432065, -30.6005773987), (6.3892768918, -28.6137065614))
        make_face()
        with Locations((0, -32.766)):
            Circle(F0_R, mode=Mode.SUBTRACT)
    extrude(amount=F1_DEPTH)

    # F2
    f2_edges = [f1.edges().sort_by_distance(p)[0] for p in [
        (-6.869251, 29.467851, 3.175),
        (-29.467851, 6.869251, 3.175),
        (-29.467851, -6.869251, 3.175),
        (-24.391069, -11.549931, 3.175),
        (-11.549931, -24.391069, 3.175),
        (-6.869251, -29.467851, 3.175),
        (6.389277, -28.613707, 3.175),
        (11.549931, -24.391069, 3.175),
        (24.391069, -11.549931, 3.175),
        (29.467851, -6.869251, 3.175),
        (29.467851, 6.869251, 3.175),
        (24.391069, 11.549931, 3.175),
        (11.549931, 24.391069, 3.175),
        (6.869251, 29.467851, 3.175),
        (-11.549931, 24.391069, 3.175),
        (-24.391069, 11.549931, 3.175),
    ]]
    fillet(f2_edges, radius=F2_R)

    # F3 (on Top) → F4 (join)
    with BuildSketch(Plane.XY):
        Circle(F3_R)
        Circle(F3_R_2, mode=Mode.SUBTRACT)
    extrude(amount=F4_DEPTH)

    # F5
    f5_edges = [f1.edges().sort_by_distance(p)[0] for p in [
        (-19.685, 0, 12.7),
        (-19.685, 0, 0),
    ]]
    fillet(f5_edges, radius=F5_R)


solid = f1.part
